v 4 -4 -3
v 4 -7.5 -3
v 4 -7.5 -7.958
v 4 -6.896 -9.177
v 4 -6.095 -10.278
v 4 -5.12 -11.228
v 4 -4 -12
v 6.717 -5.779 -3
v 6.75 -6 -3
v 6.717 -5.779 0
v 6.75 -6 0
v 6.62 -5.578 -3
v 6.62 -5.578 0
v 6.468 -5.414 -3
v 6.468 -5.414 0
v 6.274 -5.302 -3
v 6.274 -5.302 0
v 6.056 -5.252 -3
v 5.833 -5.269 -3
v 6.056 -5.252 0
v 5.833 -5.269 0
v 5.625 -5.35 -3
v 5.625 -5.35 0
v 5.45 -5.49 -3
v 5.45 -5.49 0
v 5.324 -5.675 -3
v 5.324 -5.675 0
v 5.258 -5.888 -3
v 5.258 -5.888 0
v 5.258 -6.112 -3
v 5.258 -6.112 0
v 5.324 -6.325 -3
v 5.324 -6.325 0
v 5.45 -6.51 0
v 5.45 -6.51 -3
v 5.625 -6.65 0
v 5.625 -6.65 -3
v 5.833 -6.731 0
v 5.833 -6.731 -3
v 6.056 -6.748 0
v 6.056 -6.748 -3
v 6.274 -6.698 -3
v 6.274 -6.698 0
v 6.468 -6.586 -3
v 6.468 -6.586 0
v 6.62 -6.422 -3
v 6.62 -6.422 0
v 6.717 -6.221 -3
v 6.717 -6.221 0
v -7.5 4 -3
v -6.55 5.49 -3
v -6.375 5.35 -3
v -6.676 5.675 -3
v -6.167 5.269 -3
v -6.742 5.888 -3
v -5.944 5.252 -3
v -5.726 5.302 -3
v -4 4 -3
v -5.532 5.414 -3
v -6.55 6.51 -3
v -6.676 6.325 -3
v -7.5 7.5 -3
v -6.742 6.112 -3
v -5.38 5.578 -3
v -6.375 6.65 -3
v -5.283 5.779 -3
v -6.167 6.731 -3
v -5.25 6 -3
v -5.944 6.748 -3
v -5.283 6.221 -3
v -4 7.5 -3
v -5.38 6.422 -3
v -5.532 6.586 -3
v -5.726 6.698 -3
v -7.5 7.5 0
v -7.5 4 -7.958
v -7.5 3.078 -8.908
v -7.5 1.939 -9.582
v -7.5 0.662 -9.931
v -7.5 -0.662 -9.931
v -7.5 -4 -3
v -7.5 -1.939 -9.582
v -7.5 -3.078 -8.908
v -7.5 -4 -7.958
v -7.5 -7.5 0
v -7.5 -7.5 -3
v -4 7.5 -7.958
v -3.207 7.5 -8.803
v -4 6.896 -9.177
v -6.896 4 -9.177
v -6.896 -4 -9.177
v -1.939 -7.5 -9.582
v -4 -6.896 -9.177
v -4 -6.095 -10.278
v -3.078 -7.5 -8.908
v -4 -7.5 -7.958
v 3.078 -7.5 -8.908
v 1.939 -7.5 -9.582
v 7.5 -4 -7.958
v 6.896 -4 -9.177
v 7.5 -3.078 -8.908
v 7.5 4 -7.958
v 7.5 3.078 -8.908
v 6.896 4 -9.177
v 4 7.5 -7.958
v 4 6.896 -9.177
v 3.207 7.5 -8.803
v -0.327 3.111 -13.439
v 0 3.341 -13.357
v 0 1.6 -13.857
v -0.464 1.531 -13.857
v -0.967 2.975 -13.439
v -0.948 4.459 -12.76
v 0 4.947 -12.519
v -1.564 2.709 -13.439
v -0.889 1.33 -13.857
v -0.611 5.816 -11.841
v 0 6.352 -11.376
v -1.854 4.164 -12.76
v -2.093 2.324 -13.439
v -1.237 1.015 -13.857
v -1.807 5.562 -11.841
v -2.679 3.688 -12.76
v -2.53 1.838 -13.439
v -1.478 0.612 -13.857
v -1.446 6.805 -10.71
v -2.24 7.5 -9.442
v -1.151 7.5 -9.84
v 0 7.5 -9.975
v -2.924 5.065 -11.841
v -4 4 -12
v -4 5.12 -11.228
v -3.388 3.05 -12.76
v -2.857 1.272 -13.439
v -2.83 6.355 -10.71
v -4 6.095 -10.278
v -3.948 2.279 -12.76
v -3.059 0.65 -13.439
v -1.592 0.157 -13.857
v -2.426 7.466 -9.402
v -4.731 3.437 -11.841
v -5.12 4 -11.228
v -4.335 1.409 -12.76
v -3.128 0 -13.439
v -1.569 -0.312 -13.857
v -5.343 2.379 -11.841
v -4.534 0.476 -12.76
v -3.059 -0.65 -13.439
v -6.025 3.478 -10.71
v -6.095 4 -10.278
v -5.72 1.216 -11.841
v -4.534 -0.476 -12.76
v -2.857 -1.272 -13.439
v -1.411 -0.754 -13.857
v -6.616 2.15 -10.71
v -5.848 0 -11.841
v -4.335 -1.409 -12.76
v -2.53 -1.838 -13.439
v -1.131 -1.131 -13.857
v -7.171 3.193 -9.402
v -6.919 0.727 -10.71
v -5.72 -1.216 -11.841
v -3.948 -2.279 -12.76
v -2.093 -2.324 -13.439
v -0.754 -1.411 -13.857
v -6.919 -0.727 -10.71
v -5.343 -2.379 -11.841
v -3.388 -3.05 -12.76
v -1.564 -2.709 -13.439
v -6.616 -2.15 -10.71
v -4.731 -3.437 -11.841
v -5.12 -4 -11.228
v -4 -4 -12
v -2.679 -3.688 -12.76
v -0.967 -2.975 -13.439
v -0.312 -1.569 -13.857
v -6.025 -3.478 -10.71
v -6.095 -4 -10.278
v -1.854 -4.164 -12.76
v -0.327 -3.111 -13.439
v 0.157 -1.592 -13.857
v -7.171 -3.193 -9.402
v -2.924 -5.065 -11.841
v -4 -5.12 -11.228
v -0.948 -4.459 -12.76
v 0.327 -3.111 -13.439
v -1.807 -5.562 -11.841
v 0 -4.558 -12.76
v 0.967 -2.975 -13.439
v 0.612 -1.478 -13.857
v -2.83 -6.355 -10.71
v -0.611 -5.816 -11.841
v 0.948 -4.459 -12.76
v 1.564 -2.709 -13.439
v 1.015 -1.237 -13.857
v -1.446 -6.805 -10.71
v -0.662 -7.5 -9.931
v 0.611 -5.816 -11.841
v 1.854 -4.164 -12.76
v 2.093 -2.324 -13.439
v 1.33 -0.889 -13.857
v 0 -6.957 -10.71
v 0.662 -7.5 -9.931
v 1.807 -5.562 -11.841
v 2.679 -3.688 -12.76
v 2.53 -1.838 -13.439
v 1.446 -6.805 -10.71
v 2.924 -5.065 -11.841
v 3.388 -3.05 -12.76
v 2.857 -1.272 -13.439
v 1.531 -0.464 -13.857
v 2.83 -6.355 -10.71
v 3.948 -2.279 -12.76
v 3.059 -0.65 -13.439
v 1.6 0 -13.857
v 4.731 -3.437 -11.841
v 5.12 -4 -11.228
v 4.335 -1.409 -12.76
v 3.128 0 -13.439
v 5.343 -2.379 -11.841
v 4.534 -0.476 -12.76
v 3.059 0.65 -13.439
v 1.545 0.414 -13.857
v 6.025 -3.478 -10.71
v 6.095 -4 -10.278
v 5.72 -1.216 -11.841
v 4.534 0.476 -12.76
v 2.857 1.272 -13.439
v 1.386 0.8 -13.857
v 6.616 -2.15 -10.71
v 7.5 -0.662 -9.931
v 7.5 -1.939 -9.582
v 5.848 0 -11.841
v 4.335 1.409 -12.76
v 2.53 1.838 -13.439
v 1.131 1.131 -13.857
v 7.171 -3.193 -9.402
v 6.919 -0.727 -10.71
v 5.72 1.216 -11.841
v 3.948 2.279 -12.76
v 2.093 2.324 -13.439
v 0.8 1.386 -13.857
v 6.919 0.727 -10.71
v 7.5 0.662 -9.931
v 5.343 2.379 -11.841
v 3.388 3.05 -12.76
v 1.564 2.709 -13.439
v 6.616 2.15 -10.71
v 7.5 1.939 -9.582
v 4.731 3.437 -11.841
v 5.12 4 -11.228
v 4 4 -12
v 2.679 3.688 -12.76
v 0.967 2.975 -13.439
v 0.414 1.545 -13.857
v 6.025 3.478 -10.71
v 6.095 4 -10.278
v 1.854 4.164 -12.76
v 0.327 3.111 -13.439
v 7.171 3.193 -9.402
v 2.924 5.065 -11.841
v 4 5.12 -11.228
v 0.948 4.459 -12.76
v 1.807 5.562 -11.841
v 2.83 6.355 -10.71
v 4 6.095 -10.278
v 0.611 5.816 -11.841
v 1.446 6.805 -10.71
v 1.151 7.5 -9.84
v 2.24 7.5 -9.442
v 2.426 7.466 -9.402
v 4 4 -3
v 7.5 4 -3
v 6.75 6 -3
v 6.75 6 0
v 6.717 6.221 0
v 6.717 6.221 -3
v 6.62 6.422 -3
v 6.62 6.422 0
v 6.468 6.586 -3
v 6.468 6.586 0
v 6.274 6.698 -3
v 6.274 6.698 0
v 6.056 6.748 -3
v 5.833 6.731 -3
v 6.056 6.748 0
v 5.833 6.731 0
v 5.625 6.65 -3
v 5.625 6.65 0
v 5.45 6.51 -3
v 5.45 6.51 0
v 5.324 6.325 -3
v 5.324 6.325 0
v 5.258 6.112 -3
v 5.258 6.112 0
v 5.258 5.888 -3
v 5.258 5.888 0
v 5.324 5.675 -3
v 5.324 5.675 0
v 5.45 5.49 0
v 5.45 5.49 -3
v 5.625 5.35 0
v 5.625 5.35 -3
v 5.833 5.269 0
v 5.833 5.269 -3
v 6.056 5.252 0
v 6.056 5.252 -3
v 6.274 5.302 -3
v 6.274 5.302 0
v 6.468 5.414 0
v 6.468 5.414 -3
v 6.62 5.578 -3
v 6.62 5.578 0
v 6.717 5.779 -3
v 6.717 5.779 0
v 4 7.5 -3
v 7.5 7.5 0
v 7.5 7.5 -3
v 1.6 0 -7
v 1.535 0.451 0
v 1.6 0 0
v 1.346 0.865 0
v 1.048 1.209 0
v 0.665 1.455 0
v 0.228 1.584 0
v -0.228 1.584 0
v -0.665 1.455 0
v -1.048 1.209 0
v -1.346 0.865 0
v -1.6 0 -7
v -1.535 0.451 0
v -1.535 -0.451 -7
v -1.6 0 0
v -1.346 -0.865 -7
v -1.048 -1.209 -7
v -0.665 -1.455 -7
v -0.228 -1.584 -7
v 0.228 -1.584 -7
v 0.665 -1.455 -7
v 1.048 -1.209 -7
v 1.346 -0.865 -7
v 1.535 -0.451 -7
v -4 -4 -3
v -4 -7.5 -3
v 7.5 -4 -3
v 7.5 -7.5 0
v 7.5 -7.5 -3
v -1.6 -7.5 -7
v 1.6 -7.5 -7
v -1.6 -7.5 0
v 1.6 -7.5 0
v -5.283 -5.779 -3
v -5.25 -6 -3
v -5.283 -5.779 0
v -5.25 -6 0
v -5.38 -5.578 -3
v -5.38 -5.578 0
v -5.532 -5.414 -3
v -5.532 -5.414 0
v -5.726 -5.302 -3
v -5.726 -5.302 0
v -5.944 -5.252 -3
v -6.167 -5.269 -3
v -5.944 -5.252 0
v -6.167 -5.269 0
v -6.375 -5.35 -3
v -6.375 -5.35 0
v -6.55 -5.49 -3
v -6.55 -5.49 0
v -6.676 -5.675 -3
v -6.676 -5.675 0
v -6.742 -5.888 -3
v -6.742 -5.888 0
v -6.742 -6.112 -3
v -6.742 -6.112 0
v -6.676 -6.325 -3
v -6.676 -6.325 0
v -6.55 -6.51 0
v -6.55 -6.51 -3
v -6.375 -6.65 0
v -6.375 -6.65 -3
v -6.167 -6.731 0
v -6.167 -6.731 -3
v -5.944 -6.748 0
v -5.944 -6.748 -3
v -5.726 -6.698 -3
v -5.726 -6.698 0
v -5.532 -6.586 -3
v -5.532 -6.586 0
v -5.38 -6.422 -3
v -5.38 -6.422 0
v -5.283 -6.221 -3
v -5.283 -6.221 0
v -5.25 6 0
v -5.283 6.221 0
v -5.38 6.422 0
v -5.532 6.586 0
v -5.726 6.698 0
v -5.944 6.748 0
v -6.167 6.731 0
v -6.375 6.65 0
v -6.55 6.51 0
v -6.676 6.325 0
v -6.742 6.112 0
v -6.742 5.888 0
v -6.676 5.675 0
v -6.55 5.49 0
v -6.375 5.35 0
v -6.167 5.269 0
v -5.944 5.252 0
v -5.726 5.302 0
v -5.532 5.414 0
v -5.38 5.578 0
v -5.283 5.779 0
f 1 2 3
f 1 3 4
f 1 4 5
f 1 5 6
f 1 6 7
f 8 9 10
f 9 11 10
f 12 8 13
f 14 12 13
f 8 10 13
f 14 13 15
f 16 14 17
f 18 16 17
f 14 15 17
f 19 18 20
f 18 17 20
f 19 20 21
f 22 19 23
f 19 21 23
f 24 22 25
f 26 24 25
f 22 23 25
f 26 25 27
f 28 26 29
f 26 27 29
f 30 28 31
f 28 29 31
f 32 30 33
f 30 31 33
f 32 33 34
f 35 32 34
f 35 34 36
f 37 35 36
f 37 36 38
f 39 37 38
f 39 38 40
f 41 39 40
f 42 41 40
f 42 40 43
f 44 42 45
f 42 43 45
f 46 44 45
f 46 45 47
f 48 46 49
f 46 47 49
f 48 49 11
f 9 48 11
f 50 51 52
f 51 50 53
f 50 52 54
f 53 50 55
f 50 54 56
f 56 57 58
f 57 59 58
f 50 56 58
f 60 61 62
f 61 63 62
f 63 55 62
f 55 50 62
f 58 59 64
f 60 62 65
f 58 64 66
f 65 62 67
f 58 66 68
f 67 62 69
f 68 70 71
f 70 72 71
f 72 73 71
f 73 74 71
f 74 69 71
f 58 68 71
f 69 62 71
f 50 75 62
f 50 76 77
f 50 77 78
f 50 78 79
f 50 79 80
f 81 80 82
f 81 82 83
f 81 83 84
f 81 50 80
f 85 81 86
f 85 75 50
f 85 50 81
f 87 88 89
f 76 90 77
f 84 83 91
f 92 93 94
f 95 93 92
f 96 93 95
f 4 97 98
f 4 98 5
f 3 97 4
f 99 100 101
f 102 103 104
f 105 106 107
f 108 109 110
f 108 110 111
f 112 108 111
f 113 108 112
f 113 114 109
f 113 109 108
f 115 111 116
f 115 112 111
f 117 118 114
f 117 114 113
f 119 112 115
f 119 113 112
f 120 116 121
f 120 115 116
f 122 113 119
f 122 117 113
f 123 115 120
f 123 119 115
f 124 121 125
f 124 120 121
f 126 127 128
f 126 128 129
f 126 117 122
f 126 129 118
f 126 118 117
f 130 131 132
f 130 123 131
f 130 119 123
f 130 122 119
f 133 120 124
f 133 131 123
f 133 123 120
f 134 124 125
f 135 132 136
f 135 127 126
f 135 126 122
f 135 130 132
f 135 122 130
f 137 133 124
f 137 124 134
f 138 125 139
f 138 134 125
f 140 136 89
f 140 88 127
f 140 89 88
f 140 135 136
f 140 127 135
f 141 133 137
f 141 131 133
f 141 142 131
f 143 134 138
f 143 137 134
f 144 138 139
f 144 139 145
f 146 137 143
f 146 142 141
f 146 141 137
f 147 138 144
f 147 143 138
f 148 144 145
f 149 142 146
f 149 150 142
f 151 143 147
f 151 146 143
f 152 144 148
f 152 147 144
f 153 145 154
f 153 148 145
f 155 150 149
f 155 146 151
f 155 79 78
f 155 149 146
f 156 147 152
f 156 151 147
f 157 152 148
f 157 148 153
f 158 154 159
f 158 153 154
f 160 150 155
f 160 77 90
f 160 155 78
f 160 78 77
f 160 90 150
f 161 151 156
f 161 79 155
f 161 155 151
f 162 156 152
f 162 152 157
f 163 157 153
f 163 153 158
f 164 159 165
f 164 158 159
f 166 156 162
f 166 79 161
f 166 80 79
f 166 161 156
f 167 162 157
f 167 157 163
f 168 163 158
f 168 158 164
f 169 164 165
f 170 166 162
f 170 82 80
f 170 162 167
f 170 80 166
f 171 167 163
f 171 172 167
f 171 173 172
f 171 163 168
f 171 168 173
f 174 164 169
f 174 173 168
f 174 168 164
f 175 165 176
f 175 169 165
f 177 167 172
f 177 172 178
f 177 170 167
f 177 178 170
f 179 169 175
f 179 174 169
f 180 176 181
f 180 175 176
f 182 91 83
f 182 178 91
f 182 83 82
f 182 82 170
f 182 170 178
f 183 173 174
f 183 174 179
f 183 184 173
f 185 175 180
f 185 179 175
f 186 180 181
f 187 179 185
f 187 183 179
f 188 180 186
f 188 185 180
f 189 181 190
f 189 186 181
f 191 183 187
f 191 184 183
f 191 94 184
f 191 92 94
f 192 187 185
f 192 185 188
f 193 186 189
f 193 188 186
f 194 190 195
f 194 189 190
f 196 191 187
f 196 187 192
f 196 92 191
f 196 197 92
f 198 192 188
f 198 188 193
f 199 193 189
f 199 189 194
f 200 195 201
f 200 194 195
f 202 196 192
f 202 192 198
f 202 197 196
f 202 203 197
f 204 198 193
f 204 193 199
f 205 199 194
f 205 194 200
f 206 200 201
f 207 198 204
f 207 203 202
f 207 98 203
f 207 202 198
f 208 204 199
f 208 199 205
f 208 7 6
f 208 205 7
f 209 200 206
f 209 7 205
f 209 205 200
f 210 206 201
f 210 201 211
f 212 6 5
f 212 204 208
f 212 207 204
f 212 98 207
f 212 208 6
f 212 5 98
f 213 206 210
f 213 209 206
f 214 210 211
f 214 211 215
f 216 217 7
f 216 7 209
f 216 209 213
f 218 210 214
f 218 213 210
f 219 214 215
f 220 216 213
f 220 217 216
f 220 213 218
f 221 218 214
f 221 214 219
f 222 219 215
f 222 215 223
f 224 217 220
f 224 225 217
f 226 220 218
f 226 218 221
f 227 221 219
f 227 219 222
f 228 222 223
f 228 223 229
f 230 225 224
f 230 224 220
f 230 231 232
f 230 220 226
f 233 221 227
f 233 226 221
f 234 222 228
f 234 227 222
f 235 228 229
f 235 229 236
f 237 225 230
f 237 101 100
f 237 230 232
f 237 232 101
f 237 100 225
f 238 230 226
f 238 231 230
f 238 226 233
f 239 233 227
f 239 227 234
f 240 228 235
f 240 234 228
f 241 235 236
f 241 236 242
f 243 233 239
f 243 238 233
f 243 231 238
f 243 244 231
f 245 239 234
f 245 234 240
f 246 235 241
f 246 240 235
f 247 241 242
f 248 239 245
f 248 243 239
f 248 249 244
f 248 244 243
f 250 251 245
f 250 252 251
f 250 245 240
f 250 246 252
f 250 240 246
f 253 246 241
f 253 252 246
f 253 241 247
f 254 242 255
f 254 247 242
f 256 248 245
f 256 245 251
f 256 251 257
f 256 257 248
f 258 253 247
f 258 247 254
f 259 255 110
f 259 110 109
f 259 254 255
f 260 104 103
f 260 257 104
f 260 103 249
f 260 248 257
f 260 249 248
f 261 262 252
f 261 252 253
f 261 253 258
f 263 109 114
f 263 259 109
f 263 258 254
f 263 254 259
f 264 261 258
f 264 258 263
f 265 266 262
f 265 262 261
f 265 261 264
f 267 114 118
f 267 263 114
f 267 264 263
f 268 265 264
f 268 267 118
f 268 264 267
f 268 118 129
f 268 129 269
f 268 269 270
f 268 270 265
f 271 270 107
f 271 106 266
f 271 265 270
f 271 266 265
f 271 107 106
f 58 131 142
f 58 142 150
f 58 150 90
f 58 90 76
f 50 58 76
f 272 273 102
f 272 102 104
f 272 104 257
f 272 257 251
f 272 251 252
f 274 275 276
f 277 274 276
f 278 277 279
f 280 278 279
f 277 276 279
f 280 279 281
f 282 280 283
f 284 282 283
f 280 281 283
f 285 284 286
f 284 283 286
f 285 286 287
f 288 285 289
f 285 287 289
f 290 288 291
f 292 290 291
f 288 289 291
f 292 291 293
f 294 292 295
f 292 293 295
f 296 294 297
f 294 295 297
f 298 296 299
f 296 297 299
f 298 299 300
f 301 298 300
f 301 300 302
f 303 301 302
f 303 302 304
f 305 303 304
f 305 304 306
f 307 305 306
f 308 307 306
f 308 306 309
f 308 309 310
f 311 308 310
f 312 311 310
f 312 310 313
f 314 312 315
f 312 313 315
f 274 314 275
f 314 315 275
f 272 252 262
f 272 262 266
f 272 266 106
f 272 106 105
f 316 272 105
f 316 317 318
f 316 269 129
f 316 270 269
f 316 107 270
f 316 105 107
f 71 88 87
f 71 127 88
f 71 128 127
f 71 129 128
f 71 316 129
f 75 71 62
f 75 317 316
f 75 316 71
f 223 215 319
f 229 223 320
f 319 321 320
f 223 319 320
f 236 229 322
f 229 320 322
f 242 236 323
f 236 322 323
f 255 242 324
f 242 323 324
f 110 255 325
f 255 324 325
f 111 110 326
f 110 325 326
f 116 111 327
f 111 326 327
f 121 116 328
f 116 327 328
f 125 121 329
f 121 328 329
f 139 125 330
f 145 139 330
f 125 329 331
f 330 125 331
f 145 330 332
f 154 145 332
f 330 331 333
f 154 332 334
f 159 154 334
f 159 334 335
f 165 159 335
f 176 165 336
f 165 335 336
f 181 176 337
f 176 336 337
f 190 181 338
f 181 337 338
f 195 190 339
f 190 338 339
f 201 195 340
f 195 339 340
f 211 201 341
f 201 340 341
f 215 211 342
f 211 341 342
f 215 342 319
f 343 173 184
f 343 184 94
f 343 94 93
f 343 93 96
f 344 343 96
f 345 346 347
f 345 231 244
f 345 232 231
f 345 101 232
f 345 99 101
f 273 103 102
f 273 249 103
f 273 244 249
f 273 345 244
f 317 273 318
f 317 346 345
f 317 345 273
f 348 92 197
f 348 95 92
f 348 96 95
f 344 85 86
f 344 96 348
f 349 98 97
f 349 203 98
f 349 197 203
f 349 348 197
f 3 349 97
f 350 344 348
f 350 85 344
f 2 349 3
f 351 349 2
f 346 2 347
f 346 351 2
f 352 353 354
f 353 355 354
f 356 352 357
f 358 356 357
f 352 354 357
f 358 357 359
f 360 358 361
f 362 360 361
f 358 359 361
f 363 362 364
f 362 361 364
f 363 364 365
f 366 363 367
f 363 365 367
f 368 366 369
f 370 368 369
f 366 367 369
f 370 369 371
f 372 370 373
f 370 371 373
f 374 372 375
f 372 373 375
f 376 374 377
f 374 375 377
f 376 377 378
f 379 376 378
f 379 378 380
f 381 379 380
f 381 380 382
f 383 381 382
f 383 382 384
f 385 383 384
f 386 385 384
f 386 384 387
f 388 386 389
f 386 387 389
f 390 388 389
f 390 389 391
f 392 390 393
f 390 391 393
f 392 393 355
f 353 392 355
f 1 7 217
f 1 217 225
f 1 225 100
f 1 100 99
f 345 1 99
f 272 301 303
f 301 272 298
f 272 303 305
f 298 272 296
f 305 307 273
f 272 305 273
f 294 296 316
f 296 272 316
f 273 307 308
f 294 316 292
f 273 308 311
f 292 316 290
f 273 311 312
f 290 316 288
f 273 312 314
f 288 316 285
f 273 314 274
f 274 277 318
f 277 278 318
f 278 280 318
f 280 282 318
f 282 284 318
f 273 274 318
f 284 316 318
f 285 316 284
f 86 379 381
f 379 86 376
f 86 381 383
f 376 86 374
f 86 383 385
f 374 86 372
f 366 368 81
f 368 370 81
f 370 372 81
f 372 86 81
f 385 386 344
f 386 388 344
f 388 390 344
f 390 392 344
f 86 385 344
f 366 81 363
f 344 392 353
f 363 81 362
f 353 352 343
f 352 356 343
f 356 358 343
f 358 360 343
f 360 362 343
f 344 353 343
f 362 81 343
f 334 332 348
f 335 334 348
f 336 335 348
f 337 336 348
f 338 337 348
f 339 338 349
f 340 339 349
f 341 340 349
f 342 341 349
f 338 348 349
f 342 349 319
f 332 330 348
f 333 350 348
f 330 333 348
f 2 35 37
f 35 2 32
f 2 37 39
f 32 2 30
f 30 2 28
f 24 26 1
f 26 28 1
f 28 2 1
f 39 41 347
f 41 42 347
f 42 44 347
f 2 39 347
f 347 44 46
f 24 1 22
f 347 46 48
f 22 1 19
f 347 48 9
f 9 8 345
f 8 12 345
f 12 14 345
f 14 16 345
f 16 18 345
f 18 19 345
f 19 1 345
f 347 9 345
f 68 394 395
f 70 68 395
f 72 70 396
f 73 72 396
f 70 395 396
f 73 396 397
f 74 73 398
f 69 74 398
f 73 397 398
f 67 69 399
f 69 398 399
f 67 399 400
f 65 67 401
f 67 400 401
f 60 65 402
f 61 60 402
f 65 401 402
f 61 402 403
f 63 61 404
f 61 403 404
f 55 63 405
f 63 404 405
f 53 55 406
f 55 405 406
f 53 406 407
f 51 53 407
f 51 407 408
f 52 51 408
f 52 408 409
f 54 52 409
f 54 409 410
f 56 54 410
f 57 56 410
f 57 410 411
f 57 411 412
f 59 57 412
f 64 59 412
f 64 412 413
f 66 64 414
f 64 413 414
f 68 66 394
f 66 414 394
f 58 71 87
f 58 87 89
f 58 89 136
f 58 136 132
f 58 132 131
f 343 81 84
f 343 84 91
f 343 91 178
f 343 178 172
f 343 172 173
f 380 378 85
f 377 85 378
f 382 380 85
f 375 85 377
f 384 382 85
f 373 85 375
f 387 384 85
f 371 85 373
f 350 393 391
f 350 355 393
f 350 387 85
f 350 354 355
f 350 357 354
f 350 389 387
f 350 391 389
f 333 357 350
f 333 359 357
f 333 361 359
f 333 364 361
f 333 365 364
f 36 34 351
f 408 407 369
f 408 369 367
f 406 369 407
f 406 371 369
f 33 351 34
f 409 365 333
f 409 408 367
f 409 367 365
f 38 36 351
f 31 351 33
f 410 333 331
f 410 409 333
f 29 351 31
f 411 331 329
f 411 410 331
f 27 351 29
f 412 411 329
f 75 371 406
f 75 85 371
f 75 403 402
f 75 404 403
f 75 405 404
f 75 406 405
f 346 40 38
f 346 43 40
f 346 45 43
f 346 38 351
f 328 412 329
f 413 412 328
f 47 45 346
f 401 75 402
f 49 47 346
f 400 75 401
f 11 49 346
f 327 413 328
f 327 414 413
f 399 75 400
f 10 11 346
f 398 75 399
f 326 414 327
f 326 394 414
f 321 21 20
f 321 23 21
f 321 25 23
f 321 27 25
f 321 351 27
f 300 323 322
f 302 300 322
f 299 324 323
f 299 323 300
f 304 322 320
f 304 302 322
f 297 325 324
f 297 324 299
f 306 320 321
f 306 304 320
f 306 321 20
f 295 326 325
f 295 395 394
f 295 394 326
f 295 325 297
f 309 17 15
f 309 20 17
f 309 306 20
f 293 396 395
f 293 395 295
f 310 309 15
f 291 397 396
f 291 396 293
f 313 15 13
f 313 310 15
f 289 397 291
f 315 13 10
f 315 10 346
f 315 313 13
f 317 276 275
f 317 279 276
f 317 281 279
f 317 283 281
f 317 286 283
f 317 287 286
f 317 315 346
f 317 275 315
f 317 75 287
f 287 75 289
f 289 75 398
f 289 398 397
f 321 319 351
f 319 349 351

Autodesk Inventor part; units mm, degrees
ref_plane "YZ Plane" through (0, 0, 0) normal (1, 0, 0) x (0, 1, 0)
ref_plane "XZ Plane" through (0, 0, 0) normal (0, 1, 0) x (-1, 0, 0)
sketch "Boceto1" plane through (0, 0, 0) normal (0, 0, 1) x (1, 0, 0)
  line L0 (-7.5, -7.5) -> (7.5, -7.5)
  line L1 (7.5, -7.5) -> (7.5, 7.5)
  line L2 (7.5, 7.5) -> (-7.5, 7.5)
  line L3 (-7.5, 7.5) -> (-7.5, -7.5)
  line L4 (-7.5, -7.5) -> (7.5, 7.5) construction
  line L5 (7.5, -7.5) -> (-7.5, 7.5) construction
  point P0 (0, 0)
  dimension "d0" = 15
extrude "Extrusión1" add sketch "Boceto1" against normal blind 5
ref_plane "Plano de trabajo1" through (0, -7.5, 0) normal (1, 0, 0) x (0, 0, -1)
sketch "Boceto2" plane through (0, -7.5, 0) normal (1, 0, 0) x (0, 0, -1)
  line L0 (5, 15) -> (5, 0) projected
  arc A0 (14, 7.5) -> (5, 16.5) centre (5, 7.5) ccw
  line L1 (5, 7.5) -> (14, 7.5)
  line L2 (5, 7.5) -> (5, 16.5)
  point P0 (0, 7.5)
  dimension "d5" = 9
revolve "Revolución1" add sketch "Boceto2" angle 360 about axis through (0, 0, -5) along (0, 0, -1)
sketch "Boceto3" plane through (0, 0, 0) normal (0, 0, 1) x (1, 0, 0)
  line L0 (-7.5, 7.5) -> (-7.5, -7.5) projected
  line L1 (-7.5, 7.5) -> (7.5, 7.5)
  line L2 (7.5, 7.5) -> (7.5, -7.5)
  line L3 (7.5, -7.5) -> (-7.5, -7.5)
  line L4 (-7.5, -7.5) -> (-7.5, 7.5)
  circle A0 centre (0, 0) radius 9
  arc A1 (-4.9749, -7.5) -> (4.9749, -7.5) centre (0, 0) ccw projected
  line L5 (-7.5, -7.5) -> (7.5, -7.5) projected
  line L6 (7.5, -7.5) -> (7.5, 7.5) projected
  line L7 (-7.5, 7.5) -> (-4, 7.5)
  line L8 (-4, 7.5) -> (-4, 4)
  line L9 (-4, 4) -> (-7.5, 4)
  line L10 (-7.5, 4) -> (-7.5, 7.5)
  line L11 (-7.5, -7.5) -> (-7.5, -4)
  line L12 (-7.5, -4) -> (-4, -4)
  line L13 (-4, -4) -> (-4, -7.5)
  line L14 (-4, -7.5) -> (-7.5, -7.5)
  line L15 (7.5, -7.5) -> (4, -7.5)
  line L16 (4, -7.5) -> (4, -4)
  line L17 (4, -4) -> (7.5, -4)
  line L18 (7.5, -4) -> (7.5, -7.5)
  line L19 (7.5, 7.5) -> (7.5, 4)
  line L20 (7.5, 4) -> (4, 4)
  line L21 (4, 4) -> (4, 7.5)
  line L22 (4, 7.5) -> (7.5, 7.5)
  point P0 (-7.5, -7.5)
  point P1 (7.5, -4.9749)
  point P2 (7.5, 4.9749)
  point P3 (7.5, -4)
  point P4 (4, -7.5)
  point P5 (4, 7.5)
  point P6 (7.5, 4)
  dimension "d9" = 3.5
  dimension "d12" = 360
extrude "Extrusión2" cut sketch "Boceto3" against normal up to next contours L0 A0 | L0 A0 L1 L8 L9 | L12 L13 L3 A0 L0 | L0 L1 A0 | A0 L3 L0 | A0 L1 | L3 A0 | A0 L2 L20 L21 L1 | L1 L2 A0 | A0 L2 L3 | L3 L16 L17 L2 A0 | A0 L2
sketch "Boceto4" plane through (0, 0, 0) normal (0, 0, 1) x (1, 0, 0)
  line L0 (-7.5, -7.5) -> (7.5, -7.5)
  line L1 (7.5, -7.5) -> (7.5, 7.5)
  line L2 (7.5, 7.5) -> (-7.5, 7.5)
  line L3 (-7.5, 7.5) -> (-7.5, -7.5)
  line L4 (-7.5, -7.5) -> (7.5, 7.5) construction
  line L5 (7.5, -7.5) -> (-7.5, 7.5) construction
  line L6 (4, 7.5) -> (-4, 7.5) projected
  line L7 (7.5, -4) -> (7.5, 4) projected
  point P0 (0, 0)
extrude "Extrusión3" add sketch "Boceto4" against normal blind 3
sketch "Boceto5" plane through (0, 0, 0) normal (0, 0, 1) x (1, 0, 0)
  circle A0 centre (-6, -6) radius 0.75
  circle A1 centre (6, -6) radius 0.75
  circle A2 centre (6, 6) radius 0.75
  circle A3 centre (-6, 6) radius 0.75
  circle A4 centre (0, 0) radius 1.6
  dimension "d16" = 1.5
  dimension "d19" = 360
  dimension "d25" = 3.2
extrude "Extrusión4" cut sketch "Boceto5" against normal up to next
sketch "Boceto6" plane through (-7.5, -7.5, 0) normal (0, -1, 0) x (1, 0, 0)
  line L0 (5.9, 7) -> (5.9, -7)
  line L1 (5.9, -7) -> (9.1, -7)
  line L2 (9.1, -7) -> (9.1, 7)
  line L3 (9.1, 7) -> (5.9, 7)
  line L4 (5.9, 7) -> (9.1, -7) construction
  line L5 (5.9, -7) -> (9.1, 7) construction
  point P0 (7.5, 0)
  point P1 (7.5, 0)
  dimension "d26" = 3.2
  dimension "d27" = 7
extrude "Extrusión5" cut sketch "Boceto6" against normal blind 7.5
properties part number "sujecion_cable_2"
